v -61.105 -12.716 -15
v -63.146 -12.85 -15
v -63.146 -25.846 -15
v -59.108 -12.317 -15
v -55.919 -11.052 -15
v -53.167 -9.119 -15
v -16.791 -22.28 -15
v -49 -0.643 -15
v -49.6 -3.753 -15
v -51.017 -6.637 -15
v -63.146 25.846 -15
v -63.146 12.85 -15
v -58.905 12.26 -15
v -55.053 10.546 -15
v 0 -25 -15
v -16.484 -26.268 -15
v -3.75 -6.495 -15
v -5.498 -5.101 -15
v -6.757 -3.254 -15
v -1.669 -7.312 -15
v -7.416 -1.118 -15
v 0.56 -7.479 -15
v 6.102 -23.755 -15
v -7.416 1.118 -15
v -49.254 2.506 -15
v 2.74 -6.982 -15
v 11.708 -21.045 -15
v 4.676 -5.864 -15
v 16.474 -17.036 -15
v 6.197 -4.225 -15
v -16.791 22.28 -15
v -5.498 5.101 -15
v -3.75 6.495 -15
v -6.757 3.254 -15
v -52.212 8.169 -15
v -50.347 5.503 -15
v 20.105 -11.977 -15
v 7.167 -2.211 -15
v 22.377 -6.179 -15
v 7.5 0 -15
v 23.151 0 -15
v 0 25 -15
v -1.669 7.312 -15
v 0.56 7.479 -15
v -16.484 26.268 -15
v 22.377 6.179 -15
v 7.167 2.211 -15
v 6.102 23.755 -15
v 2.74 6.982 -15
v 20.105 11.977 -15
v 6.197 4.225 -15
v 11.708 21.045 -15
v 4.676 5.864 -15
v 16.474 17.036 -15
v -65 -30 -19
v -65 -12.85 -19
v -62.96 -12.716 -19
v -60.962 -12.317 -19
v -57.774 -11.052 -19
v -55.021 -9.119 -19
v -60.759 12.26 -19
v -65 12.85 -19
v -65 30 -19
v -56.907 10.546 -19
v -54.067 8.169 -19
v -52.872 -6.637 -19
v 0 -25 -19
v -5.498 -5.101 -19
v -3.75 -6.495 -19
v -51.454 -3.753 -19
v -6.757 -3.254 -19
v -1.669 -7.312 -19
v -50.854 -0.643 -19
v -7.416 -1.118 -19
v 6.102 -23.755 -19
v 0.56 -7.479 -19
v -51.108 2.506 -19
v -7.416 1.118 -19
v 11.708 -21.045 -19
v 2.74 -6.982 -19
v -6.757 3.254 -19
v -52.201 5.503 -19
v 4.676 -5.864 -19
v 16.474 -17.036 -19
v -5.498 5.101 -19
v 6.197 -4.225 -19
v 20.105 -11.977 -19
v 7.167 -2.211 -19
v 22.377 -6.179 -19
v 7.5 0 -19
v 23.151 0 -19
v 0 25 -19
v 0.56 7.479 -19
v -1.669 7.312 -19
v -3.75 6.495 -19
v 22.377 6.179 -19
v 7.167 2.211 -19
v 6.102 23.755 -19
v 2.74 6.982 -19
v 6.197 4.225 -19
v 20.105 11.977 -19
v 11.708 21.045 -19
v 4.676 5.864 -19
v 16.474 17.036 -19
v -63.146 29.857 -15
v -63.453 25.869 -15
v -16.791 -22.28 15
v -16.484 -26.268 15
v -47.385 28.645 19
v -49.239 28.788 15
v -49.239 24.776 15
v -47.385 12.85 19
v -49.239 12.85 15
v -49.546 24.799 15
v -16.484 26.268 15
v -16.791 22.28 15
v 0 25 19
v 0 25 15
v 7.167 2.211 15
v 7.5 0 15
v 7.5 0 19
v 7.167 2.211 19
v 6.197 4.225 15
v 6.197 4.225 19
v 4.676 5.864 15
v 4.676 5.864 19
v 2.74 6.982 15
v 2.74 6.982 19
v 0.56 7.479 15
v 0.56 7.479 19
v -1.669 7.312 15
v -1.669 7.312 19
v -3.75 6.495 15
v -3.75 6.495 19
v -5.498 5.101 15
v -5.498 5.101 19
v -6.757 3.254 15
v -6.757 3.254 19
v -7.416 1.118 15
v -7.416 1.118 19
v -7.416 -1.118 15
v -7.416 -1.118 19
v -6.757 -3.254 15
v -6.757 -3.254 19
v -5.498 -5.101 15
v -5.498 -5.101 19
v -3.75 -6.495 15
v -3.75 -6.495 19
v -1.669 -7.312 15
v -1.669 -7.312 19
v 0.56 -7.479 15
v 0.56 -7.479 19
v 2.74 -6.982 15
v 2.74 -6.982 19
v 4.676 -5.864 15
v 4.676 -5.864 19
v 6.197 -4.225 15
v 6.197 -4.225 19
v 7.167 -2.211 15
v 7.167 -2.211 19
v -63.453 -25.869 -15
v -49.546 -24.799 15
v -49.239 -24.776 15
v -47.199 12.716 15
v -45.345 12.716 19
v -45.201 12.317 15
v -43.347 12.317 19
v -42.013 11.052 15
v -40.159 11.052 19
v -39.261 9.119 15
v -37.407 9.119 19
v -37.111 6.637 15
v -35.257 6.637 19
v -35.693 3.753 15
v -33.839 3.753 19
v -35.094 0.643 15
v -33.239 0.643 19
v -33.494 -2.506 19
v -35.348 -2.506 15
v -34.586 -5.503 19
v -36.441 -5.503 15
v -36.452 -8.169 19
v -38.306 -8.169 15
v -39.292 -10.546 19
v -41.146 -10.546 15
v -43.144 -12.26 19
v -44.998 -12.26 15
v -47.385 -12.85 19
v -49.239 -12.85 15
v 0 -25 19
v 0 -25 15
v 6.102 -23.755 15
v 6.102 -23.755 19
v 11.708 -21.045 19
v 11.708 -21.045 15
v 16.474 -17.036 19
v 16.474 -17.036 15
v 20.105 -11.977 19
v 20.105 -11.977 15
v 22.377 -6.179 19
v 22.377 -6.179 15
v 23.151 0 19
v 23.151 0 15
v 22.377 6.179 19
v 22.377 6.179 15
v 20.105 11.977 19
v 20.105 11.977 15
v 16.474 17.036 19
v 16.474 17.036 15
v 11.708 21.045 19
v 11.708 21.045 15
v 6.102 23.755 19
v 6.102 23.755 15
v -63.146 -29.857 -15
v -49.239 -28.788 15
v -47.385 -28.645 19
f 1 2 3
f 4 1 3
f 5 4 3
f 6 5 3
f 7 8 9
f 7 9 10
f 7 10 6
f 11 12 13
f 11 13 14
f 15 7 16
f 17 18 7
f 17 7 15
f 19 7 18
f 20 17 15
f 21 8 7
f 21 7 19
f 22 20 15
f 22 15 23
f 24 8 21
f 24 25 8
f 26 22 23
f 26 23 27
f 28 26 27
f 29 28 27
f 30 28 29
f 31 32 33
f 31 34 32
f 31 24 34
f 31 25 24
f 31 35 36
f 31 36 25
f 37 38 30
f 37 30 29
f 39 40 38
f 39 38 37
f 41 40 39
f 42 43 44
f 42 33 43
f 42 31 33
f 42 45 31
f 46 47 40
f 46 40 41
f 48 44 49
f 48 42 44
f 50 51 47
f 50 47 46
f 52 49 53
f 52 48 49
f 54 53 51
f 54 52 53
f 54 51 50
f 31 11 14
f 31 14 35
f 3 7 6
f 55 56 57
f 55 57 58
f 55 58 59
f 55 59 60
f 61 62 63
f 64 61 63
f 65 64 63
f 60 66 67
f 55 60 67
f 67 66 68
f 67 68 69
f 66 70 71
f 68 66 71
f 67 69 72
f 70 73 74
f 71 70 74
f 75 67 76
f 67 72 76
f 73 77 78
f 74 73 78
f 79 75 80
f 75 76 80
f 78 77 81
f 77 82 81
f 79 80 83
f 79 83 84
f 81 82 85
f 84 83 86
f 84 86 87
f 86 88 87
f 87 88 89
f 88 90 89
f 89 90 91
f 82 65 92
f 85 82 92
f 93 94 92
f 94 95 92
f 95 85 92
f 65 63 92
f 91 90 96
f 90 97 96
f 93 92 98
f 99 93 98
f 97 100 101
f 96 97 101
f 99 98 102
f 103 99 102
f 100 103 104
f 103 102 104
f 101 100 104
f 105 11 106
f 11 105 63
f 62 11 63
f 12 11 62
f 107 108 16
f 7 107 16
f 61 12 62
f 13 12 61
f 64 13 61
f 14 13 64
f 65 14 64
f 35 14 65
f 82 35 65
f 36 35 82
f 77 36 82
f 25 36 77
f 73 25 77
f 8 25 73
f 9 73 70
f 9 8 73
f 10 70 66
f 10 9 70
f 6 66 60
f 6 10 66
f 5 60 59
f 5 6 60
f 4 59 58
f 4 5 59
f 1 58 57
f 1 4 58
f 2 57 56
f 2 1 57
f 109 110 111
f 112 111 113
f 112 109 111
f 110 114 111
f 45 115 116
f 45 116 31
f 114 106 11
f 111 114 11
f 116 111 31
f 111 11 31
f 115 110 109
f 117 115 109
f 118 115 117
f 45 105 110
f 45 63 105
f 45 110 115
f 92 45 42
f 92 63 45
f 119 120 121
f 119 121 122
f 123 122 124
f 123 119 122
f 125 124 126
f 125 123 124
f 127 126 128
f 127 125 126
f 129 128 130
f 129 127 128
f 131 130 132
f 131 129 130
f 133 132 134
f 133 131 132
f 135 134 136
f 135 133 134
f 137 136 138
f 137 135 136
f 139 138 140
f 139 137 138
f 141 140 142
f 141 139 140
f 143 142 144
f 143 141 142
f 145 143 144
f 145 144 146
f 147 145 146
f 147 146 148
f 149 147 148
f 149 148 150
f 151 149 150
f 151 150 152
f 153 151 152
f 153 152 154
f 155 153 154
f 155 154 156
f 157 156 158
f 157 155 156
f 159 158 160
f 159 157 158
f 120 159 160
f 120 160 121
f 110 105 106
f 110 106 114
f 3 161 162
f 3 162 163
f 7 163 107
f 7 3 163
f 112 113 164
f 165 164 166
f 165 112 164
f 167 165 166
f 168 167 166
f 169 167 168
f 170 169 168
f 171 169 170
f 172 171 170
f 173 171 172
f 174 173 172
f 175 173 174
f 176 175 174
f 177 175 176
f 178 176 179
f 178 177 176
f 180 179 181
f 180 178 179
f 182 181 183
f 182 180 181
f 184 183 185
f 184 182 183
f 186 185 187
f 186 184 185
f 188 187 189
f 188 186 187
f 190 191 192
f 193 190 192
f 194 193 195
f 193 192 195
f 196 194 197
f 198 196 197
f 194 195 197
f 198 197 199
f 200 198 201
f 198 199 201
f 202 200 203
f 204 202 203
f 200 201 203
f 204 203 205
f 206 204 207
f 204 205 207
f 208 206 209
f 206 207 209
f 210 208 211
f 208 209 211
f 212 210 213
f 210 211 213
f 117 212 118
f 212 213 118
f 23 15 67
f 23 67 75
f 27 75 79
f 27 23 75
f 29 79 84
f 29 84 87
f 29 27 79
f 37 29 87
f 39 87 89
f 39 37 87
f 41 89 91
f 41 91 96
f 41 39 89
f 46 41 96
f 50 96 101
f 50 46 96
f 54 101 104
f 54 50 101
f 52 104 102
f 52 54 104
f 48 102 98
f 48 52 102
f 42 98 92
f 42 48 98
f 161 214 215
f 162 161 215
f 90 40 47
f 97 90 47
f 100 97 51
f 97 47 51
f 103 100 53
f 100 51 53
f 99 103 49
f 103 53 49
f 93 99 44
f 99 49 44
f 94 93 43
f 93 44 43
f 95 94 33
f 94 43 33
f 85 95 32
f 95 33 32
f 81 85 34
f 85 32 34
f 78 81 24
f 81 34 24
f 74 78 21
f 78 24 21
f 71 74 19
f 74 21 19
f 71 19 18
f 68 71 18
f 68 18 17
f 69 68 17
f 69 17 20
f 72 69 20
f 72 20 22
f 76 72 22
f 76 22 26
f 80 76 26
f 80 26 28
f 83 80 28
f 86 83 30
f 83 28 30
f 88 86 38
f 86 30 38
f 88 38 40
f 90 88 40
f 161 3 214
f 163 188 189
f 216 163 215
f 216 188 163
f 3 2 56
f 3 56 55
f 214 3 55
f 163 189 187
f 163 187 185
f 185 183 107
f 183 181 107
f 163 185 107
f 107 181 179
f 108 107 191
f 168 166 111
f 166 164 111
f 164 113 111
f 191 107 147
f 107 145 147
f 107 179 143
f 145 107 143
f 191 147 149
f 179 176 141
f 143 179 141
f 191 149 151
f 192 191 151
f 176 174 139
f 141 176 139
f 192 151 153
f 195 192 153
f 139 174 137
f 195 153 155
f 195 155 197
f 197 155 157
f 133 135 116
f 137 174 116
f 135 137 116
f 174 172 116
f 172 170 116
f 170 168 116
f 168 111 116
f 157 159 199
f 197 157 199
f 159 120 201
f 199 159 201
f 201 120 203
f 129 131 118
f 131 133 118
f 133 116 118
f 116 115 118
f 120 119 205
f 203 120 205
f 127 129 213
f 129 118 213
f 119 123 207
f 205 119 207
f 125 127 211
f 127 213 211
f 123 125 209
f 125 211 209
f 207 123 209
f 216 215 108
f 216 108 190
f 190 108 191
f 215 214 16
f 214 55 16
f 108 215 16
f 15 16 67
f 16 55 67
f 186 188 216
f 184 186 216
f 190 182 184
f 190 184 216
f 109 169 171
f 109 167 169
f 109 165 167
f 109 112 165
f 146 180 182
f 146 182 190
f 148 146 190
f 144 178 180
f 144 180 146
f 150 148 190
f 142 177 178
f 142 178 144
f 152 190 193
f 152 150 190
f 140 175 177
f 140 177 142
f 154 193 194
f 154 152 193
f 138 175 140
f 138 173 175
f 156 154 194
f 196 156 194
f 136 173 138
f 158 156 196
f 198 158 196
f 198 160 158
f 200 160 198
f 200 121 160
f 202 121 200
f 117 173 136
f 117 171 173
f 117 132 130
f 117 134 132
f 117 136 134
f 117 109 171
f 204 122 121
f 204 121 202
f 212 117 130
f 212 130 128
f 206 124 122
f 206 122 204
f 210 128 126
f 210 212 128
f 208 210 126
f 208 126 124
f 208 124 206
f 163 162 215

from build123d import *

# Parameters (mm, degrees)
SKETCH2_R           = 7.5
BOSS_EXTRUDE2_DEPTH = 4
CUT_EXTRUDE1_DEPTH  = 67
BOSS_EXTRUDE3_DEPTH = 4


with BuildPart() as part:
    # Sketch2 → Boss-Extrude2 (new body)
    with BuildSketch(Plane.XY.offset(15)):
        with BuildLine():
            Line((-65, 30), (-65, -30))
            Line((-65, -30), (0, -25))
            ThreePointArc((0, -25), (23.150778482, 0), (0, 25))
            Line((0, 25), (-65, 30))
        make_face()
        Circle(SKETCH2_R, mode=Mode.SUBTRACT)
    extrude(amount=BOSS_EXTRUDE2_DEPTH)


with BuildPart() as body_2:
    # Mirror2: mirrored copy
    add(part.part.mirror(Plane.XY))


with BuildPart() as cut_extrude1_tool:
    # 3DSketch3 → Cut-Extrude1 (new body)
    with BuildSketch(Plane(origin=(-40.440866858, 30.316826109, 33.980744524), x_dir=(-0.63193986599376, -0.7175244265183314, 0.2929346396678423), z_dir=(0.4205608285392174, 0, 0.9072643437821234))):
        with BuildLine():
            Line((0, 0), (12.532874387, 12.166226775))
            ThreePointArc((12.532874387, 12.166226775), (12.802609816, 30.336869108), (30.973252149, 30.067133679))
            Line((30.973252149, 30.067133679), (43.506126536, 42.233360454))
            Line((43.506126536, 42.233360454), (85.796169664, 0))
            Line((85.796169664, 0), (25.881179802, -39.378555401))
            Line((25.881179802, -39.378555401), (0, 0))
        make_face()
    extrude(amount=-CUT_EXTRUDE1_DEPTH)


with BuildPart() as part_1:
    add(part.part)

    # Cut-Extrude1: cut by cut_extrude1_tool
    add(cut_extrude1_tool.part, mode=Mode.SUBTRACT)



with BuildPart() as body_2_1:
    add(body_2.part)

    # Cut-Extrude1: cut by cut_extrude1_tool
    add(cut_extrude1_tool.part, mode=Mode.SUBTRACT)


with BuildPart() as part_2:
    add(part_1.part)

    add(body_2_1.part)  # Boss-Extrude3 merges body 2
    # Sketch3 → Boss-Extrude3 (add)
    with BuildSketch(Plane(origin=(1.911764706, 24.852941176, 0), x_dir=(0.9970544855015816, -0.0766964988847369, 0), z_dir=(0.0766964988847369, 0.9970544855015816, 0))):
        Polygon((-65.249765706, 15), (-51.302234569, -15), (-18.449990724, -15), (-18.449990724, 15), align=None)
    boss_extrude3 = extrude(amount=-BOSS_EXTRUDE3_DEPTH)

    # Mirror3: Boss-Extrude3 across plane
    add(boss_extrude3.mirror(Plane.ZX))


solid = part_2.part
